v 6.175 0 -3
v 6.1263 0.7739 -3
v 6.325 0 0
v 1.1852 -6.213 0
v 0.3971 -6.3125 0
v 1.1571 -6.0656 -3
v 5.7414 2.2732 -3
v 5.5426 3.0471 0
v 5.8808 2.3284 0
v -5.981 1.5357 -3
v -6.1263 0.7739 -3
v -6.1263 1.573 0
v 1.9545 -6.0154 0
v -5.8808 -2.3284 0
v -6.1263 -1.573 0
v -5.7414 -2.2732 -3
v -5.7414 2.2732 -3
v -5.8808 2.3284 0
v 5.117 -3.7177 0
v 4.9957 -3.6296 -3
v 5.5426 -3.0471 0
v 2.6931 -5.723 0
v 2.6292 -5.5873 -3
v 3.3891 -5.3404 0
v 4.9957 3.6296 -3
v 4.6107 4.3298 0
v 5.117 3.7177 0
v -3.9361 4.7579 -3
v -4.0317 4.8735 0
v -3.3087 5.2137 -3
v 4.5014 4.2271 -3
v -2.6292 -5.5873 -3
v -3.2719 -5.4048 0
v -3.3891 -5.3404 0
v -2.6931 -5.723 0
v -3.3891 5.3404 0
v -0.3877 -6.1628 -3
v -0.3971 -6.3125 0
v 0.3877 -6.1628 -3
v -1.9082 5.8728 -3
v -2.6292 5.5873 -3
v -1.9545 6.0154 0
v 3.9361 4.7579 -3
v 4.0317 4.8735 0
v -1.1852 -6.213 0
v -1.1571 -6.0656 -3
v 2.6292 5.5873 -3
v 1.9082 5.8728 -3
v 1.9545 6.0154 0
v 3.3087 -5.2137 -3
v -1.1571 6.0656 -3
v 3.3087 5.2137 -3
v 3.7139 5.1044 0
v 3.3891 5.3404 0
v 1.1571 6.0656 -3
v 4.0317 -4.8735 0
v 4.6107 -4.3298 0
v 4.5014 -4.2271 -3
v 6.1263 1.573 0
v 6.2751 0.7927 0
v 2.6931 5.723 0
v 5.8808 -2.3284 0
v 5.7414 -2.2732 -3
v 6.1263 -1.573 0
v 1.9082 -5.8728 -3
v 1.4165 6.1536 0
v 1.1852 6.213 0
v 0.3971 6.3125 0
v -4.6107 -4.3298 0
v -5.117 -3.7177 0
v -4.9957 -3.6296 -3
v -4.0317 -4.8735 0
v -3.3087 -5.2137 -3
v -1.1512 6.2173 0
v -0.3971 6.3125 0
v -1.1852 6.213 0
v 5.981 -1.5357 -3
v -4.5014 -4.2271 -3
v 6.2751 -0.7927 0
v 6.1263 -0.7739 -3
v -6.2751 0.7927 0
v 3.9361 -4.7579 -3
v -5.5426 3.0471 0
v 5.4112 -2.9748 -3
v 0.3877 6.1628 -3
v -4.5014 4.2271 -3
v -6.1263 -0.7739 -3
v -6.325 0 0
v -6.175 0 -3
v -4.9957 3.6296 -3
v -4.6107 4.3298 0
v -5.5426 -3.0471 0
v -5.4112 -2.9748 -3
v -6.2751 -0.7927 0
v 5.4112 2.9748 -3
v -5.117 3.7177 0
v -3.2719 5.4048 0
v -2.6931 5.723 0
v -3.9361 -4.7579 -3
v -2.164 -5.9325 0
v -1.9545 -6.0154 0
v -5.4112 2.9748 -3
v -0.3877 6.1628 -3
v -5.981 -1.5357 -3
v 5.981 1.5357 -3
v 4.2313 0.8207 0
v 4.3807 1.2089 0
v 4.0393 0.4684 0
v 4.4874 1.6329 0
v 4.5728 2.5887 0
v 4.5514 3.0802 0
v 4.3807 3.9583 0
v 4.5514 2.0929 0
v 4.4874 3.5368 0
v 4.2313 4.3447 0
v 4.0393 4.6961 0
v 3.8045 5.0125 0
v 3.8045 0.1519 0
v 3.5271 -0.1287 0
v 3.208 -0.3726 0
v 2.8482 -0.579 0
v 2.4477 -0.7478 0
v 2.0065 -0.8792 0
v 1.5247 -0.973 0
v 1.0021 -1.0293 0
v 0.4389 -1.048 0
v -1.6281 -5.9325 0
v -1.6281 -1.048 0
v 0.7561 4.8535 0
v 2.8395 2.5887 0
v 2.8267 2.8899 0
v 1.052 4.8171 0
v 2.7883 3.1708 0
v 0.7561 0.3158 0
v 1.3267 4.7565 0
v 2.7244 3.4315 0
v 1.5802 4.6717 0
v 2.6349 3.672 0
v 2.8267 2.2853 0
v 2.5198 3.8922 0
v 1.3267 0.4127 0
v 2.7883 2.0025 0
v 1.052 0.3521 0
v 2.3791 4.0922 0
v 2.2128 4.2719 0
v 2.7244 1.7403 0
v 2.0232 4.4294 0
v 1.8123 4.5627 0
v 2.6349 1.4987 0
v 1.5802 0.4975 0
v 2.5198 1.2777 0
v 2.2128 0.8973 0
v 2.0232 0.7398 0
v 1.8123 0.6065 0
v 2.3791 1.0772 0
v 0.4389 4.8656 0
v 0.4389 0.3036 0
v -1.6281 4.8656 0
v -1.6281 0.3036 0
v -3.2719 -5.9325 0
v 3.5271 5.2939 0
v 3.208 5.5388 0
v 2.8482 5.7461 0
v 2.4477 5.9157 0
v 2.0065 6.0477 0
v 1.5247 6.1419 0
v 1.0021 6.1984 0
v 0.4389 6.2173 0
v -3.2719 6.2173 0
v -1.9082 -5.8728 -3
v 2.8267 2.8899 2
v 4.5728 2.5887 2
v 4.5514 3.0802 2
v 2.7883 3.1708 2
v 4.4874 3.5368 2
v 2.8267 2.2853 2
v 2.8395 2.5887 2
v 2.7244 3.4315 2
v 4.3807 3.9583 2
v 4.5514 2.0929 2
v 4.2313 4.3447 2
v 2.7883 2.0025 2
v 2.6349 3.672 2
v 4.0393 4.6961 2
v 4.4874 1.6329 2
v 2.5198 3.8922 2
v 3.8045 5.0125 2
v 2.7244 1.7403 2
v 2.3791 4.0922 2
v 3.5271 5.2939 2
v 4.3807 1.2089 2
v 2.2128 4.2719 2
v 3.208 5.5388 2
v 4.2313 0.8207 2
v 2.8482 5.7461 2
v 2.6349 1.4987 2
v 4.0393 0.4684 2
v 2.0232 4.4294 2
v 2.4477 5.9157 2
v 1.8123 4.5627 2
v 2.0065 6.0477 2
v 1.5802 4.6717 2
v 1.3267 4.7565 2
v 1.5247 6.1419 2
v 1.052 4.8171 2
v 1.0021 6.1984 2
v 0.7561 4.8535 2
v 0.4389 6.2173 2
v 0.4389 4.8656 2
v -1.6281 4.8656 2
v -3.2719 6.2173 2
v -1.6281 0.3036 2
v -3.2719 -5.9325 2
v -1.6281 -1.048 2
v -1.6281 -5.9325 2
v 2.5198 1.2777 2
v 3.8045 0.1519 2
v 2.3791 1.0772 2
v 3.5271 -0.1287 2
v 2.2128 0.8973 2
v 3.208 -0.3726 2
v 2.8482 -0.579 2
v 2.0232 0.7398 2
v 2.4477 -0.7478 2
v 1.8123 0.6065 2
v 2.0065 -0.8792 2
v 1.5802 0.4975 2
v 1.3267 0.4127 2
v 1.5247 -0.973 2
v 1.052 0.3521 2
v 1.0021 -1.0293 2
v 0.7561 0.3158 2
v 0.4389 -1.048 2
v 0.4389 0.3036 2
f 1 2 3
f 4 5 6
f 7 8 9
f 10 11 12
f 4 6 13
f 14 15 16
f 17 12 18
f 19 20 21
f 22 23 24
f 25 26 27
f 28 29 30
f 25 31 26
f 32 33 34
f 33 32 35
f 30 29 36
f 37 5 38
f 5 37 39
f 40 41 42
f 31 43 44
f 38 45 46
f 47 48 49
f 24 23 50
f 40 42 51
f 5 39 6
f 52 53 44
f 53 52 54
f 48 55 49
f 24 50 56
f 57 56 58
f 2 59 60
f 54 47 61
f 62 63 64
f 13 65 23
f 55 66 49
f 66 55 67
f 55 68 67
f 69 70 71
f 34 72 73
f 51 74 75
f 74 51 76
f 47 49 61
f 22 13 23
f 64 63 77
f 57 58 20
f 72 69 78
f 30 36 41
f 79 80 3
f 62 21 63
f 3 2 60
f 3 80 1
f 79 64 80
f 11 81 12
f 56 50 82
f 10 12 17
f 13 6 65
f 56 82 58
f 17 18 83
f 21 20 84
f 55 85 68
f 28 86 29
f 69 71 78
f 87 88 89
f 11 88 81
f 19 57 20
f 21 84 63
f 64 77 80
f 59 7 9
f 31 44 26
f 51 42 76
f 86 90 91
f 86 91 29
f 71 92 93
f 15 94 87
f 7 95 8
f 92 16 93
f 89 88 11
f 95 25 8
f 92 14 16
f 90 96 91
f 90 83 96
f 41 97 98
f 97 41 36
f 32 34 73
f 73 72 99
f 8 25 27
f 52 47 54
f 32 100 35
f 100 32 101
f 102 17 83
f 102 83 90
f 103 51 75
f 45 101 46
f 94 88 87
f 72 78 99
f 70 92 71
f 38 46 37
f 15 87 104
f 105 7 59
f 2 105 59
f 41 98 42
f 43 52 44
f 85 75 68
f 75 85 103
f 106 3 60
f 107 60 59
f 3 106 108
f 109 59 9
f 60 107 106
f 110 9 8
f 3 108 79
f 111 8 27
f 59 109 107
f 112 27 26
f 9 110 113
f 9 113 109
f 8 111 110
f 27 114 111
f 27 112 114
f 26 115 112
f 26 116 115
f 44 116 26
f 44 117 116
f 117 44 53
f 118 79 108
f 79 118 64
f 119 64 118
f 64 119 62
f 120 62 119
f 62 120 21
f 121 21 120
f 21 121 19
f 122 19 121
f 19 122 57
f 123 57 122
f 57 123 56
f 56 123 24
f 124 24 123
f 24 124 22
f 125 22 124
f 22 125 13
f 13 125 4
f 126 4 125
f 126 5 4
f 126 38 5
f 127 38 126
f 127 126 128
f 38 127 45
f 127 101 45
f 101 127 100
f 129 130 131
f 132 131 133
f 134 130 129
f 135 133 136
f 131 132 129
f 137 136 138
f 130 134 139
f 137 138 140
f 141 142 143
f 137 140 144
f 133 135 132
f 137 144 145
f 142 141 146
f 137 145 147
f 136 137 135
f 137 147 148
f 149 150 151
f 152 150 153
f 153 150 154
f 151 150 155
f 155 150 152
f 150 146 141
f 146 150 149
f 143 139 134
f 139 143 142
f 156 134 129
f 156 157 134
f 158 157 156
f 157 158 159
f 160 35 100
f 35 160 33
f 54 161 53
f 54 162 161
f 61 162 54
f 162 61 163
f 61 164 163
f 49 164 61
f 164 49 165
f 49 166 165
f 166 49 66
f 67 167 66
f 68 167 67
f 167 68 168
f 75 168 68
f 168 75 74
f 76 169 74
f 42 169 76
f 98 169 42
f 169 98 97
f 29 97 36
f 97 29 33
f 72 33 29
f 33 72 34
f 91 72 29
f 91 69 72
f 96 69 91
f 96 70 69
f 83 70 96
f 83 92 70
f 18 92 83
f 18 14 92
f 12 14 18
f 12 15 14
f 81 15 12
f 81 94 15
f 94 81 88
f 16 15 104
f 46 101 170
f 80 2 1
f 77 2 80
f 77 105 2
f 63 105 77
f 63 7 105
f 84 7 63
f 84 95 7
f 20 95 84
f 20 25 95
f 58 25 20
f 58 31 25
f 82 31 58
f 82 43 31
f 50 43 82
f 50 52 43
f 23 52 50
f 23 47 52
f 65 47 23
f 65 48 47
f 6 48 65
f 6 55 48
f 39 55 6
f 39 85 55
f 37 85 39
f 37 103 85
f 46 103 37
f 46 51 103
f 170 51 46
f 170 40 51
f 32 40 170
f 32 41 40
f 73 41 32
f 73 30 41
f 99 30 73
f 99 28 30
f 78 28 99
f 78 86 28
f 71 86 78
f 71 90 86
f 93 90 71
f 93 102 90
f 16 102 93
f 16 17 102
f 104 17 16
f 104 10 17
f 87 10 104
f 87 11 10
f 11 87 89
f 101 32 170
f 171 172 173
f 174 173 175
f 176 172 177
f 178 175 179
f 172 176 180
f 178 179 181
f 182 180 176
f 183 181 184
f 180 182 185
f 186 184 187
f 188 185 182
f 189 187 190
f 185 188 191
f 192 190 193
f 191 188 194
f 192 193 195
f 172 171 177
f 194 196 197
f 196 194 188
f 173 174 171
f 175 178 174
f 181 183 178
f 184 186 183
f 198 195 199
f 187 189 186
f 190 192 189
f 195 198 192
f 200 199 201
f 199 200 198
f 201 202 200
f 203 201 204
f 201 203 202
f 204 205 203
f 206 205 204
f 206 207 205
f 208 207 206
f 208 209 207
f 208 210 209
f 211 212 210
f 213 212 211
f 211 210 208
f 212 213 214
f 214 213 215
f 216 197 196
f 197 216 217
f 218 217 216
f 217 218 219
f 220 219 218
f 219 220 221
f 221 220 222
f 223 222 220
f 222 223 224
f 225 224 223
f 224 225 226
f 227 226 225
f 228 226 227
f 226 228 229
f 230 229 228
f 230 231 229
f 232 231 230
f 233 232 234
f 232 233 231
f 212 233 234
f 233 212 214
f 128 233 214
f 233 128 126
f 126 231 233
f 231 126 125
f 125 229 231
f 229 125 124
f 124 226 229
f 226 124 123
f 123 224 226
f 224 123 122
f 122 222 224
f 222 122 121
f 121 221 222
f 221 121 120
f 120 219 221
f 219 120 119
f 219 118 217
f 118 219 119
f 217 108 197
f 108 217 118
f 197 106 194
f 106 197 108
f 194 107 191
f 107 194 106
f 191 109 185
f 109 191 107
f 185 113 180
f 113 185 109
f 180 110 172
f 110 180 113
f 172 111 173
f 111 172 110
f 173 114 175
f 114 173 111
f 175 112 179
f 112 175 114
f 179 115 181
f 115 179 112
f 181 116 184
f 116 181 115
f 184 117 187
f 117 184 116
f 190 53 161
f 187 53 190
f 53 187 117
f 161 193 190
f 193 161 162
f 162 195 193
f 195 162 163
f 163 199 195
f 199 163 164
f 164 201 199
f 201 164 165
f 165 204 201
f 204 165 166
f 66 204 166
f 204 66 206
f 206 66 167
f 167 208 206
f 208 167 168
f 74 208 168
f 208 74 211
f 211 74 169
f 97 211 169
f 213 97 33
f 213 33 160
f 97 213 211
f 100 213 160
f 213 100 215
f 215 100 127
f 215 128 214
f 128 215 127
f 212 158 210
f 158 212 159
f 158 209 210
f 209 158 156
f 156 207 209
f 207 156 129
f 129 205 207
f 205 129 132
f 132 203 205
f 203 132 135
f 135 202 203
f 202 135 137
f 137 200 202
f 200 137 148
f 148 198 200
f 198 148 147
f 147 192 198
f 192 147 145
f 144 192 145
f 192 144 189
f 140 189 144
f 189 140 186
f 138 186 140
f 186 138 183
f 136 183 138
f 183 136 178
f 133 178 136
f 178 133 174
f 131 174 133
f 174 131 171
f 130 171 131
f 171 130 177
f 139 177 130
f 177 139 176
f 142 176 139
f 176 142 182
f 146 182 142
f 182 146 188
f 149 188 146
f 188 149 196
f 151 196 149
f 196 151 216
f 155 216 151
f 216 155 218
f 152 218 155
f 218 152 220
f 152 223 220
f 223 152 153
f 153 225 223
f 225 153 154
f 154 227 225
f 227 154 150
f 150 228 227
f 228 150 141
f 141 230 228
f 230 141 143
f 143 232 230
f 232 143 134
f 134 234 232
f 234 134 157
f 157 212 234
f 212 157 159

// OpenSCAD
$fn = 50;


difference() {
	union() {
		translate(v = [0, 0, -3.0000000000]) {
			cylinder(h = 3, r1 = 6.1750000000, r2 = 6.3250000000);
		}
		linear_extrude(height = 2) {
			text(font = "Impact", halign = "center", size = 12, text = "P", valign = "center");
		}
	}
	union();
}
